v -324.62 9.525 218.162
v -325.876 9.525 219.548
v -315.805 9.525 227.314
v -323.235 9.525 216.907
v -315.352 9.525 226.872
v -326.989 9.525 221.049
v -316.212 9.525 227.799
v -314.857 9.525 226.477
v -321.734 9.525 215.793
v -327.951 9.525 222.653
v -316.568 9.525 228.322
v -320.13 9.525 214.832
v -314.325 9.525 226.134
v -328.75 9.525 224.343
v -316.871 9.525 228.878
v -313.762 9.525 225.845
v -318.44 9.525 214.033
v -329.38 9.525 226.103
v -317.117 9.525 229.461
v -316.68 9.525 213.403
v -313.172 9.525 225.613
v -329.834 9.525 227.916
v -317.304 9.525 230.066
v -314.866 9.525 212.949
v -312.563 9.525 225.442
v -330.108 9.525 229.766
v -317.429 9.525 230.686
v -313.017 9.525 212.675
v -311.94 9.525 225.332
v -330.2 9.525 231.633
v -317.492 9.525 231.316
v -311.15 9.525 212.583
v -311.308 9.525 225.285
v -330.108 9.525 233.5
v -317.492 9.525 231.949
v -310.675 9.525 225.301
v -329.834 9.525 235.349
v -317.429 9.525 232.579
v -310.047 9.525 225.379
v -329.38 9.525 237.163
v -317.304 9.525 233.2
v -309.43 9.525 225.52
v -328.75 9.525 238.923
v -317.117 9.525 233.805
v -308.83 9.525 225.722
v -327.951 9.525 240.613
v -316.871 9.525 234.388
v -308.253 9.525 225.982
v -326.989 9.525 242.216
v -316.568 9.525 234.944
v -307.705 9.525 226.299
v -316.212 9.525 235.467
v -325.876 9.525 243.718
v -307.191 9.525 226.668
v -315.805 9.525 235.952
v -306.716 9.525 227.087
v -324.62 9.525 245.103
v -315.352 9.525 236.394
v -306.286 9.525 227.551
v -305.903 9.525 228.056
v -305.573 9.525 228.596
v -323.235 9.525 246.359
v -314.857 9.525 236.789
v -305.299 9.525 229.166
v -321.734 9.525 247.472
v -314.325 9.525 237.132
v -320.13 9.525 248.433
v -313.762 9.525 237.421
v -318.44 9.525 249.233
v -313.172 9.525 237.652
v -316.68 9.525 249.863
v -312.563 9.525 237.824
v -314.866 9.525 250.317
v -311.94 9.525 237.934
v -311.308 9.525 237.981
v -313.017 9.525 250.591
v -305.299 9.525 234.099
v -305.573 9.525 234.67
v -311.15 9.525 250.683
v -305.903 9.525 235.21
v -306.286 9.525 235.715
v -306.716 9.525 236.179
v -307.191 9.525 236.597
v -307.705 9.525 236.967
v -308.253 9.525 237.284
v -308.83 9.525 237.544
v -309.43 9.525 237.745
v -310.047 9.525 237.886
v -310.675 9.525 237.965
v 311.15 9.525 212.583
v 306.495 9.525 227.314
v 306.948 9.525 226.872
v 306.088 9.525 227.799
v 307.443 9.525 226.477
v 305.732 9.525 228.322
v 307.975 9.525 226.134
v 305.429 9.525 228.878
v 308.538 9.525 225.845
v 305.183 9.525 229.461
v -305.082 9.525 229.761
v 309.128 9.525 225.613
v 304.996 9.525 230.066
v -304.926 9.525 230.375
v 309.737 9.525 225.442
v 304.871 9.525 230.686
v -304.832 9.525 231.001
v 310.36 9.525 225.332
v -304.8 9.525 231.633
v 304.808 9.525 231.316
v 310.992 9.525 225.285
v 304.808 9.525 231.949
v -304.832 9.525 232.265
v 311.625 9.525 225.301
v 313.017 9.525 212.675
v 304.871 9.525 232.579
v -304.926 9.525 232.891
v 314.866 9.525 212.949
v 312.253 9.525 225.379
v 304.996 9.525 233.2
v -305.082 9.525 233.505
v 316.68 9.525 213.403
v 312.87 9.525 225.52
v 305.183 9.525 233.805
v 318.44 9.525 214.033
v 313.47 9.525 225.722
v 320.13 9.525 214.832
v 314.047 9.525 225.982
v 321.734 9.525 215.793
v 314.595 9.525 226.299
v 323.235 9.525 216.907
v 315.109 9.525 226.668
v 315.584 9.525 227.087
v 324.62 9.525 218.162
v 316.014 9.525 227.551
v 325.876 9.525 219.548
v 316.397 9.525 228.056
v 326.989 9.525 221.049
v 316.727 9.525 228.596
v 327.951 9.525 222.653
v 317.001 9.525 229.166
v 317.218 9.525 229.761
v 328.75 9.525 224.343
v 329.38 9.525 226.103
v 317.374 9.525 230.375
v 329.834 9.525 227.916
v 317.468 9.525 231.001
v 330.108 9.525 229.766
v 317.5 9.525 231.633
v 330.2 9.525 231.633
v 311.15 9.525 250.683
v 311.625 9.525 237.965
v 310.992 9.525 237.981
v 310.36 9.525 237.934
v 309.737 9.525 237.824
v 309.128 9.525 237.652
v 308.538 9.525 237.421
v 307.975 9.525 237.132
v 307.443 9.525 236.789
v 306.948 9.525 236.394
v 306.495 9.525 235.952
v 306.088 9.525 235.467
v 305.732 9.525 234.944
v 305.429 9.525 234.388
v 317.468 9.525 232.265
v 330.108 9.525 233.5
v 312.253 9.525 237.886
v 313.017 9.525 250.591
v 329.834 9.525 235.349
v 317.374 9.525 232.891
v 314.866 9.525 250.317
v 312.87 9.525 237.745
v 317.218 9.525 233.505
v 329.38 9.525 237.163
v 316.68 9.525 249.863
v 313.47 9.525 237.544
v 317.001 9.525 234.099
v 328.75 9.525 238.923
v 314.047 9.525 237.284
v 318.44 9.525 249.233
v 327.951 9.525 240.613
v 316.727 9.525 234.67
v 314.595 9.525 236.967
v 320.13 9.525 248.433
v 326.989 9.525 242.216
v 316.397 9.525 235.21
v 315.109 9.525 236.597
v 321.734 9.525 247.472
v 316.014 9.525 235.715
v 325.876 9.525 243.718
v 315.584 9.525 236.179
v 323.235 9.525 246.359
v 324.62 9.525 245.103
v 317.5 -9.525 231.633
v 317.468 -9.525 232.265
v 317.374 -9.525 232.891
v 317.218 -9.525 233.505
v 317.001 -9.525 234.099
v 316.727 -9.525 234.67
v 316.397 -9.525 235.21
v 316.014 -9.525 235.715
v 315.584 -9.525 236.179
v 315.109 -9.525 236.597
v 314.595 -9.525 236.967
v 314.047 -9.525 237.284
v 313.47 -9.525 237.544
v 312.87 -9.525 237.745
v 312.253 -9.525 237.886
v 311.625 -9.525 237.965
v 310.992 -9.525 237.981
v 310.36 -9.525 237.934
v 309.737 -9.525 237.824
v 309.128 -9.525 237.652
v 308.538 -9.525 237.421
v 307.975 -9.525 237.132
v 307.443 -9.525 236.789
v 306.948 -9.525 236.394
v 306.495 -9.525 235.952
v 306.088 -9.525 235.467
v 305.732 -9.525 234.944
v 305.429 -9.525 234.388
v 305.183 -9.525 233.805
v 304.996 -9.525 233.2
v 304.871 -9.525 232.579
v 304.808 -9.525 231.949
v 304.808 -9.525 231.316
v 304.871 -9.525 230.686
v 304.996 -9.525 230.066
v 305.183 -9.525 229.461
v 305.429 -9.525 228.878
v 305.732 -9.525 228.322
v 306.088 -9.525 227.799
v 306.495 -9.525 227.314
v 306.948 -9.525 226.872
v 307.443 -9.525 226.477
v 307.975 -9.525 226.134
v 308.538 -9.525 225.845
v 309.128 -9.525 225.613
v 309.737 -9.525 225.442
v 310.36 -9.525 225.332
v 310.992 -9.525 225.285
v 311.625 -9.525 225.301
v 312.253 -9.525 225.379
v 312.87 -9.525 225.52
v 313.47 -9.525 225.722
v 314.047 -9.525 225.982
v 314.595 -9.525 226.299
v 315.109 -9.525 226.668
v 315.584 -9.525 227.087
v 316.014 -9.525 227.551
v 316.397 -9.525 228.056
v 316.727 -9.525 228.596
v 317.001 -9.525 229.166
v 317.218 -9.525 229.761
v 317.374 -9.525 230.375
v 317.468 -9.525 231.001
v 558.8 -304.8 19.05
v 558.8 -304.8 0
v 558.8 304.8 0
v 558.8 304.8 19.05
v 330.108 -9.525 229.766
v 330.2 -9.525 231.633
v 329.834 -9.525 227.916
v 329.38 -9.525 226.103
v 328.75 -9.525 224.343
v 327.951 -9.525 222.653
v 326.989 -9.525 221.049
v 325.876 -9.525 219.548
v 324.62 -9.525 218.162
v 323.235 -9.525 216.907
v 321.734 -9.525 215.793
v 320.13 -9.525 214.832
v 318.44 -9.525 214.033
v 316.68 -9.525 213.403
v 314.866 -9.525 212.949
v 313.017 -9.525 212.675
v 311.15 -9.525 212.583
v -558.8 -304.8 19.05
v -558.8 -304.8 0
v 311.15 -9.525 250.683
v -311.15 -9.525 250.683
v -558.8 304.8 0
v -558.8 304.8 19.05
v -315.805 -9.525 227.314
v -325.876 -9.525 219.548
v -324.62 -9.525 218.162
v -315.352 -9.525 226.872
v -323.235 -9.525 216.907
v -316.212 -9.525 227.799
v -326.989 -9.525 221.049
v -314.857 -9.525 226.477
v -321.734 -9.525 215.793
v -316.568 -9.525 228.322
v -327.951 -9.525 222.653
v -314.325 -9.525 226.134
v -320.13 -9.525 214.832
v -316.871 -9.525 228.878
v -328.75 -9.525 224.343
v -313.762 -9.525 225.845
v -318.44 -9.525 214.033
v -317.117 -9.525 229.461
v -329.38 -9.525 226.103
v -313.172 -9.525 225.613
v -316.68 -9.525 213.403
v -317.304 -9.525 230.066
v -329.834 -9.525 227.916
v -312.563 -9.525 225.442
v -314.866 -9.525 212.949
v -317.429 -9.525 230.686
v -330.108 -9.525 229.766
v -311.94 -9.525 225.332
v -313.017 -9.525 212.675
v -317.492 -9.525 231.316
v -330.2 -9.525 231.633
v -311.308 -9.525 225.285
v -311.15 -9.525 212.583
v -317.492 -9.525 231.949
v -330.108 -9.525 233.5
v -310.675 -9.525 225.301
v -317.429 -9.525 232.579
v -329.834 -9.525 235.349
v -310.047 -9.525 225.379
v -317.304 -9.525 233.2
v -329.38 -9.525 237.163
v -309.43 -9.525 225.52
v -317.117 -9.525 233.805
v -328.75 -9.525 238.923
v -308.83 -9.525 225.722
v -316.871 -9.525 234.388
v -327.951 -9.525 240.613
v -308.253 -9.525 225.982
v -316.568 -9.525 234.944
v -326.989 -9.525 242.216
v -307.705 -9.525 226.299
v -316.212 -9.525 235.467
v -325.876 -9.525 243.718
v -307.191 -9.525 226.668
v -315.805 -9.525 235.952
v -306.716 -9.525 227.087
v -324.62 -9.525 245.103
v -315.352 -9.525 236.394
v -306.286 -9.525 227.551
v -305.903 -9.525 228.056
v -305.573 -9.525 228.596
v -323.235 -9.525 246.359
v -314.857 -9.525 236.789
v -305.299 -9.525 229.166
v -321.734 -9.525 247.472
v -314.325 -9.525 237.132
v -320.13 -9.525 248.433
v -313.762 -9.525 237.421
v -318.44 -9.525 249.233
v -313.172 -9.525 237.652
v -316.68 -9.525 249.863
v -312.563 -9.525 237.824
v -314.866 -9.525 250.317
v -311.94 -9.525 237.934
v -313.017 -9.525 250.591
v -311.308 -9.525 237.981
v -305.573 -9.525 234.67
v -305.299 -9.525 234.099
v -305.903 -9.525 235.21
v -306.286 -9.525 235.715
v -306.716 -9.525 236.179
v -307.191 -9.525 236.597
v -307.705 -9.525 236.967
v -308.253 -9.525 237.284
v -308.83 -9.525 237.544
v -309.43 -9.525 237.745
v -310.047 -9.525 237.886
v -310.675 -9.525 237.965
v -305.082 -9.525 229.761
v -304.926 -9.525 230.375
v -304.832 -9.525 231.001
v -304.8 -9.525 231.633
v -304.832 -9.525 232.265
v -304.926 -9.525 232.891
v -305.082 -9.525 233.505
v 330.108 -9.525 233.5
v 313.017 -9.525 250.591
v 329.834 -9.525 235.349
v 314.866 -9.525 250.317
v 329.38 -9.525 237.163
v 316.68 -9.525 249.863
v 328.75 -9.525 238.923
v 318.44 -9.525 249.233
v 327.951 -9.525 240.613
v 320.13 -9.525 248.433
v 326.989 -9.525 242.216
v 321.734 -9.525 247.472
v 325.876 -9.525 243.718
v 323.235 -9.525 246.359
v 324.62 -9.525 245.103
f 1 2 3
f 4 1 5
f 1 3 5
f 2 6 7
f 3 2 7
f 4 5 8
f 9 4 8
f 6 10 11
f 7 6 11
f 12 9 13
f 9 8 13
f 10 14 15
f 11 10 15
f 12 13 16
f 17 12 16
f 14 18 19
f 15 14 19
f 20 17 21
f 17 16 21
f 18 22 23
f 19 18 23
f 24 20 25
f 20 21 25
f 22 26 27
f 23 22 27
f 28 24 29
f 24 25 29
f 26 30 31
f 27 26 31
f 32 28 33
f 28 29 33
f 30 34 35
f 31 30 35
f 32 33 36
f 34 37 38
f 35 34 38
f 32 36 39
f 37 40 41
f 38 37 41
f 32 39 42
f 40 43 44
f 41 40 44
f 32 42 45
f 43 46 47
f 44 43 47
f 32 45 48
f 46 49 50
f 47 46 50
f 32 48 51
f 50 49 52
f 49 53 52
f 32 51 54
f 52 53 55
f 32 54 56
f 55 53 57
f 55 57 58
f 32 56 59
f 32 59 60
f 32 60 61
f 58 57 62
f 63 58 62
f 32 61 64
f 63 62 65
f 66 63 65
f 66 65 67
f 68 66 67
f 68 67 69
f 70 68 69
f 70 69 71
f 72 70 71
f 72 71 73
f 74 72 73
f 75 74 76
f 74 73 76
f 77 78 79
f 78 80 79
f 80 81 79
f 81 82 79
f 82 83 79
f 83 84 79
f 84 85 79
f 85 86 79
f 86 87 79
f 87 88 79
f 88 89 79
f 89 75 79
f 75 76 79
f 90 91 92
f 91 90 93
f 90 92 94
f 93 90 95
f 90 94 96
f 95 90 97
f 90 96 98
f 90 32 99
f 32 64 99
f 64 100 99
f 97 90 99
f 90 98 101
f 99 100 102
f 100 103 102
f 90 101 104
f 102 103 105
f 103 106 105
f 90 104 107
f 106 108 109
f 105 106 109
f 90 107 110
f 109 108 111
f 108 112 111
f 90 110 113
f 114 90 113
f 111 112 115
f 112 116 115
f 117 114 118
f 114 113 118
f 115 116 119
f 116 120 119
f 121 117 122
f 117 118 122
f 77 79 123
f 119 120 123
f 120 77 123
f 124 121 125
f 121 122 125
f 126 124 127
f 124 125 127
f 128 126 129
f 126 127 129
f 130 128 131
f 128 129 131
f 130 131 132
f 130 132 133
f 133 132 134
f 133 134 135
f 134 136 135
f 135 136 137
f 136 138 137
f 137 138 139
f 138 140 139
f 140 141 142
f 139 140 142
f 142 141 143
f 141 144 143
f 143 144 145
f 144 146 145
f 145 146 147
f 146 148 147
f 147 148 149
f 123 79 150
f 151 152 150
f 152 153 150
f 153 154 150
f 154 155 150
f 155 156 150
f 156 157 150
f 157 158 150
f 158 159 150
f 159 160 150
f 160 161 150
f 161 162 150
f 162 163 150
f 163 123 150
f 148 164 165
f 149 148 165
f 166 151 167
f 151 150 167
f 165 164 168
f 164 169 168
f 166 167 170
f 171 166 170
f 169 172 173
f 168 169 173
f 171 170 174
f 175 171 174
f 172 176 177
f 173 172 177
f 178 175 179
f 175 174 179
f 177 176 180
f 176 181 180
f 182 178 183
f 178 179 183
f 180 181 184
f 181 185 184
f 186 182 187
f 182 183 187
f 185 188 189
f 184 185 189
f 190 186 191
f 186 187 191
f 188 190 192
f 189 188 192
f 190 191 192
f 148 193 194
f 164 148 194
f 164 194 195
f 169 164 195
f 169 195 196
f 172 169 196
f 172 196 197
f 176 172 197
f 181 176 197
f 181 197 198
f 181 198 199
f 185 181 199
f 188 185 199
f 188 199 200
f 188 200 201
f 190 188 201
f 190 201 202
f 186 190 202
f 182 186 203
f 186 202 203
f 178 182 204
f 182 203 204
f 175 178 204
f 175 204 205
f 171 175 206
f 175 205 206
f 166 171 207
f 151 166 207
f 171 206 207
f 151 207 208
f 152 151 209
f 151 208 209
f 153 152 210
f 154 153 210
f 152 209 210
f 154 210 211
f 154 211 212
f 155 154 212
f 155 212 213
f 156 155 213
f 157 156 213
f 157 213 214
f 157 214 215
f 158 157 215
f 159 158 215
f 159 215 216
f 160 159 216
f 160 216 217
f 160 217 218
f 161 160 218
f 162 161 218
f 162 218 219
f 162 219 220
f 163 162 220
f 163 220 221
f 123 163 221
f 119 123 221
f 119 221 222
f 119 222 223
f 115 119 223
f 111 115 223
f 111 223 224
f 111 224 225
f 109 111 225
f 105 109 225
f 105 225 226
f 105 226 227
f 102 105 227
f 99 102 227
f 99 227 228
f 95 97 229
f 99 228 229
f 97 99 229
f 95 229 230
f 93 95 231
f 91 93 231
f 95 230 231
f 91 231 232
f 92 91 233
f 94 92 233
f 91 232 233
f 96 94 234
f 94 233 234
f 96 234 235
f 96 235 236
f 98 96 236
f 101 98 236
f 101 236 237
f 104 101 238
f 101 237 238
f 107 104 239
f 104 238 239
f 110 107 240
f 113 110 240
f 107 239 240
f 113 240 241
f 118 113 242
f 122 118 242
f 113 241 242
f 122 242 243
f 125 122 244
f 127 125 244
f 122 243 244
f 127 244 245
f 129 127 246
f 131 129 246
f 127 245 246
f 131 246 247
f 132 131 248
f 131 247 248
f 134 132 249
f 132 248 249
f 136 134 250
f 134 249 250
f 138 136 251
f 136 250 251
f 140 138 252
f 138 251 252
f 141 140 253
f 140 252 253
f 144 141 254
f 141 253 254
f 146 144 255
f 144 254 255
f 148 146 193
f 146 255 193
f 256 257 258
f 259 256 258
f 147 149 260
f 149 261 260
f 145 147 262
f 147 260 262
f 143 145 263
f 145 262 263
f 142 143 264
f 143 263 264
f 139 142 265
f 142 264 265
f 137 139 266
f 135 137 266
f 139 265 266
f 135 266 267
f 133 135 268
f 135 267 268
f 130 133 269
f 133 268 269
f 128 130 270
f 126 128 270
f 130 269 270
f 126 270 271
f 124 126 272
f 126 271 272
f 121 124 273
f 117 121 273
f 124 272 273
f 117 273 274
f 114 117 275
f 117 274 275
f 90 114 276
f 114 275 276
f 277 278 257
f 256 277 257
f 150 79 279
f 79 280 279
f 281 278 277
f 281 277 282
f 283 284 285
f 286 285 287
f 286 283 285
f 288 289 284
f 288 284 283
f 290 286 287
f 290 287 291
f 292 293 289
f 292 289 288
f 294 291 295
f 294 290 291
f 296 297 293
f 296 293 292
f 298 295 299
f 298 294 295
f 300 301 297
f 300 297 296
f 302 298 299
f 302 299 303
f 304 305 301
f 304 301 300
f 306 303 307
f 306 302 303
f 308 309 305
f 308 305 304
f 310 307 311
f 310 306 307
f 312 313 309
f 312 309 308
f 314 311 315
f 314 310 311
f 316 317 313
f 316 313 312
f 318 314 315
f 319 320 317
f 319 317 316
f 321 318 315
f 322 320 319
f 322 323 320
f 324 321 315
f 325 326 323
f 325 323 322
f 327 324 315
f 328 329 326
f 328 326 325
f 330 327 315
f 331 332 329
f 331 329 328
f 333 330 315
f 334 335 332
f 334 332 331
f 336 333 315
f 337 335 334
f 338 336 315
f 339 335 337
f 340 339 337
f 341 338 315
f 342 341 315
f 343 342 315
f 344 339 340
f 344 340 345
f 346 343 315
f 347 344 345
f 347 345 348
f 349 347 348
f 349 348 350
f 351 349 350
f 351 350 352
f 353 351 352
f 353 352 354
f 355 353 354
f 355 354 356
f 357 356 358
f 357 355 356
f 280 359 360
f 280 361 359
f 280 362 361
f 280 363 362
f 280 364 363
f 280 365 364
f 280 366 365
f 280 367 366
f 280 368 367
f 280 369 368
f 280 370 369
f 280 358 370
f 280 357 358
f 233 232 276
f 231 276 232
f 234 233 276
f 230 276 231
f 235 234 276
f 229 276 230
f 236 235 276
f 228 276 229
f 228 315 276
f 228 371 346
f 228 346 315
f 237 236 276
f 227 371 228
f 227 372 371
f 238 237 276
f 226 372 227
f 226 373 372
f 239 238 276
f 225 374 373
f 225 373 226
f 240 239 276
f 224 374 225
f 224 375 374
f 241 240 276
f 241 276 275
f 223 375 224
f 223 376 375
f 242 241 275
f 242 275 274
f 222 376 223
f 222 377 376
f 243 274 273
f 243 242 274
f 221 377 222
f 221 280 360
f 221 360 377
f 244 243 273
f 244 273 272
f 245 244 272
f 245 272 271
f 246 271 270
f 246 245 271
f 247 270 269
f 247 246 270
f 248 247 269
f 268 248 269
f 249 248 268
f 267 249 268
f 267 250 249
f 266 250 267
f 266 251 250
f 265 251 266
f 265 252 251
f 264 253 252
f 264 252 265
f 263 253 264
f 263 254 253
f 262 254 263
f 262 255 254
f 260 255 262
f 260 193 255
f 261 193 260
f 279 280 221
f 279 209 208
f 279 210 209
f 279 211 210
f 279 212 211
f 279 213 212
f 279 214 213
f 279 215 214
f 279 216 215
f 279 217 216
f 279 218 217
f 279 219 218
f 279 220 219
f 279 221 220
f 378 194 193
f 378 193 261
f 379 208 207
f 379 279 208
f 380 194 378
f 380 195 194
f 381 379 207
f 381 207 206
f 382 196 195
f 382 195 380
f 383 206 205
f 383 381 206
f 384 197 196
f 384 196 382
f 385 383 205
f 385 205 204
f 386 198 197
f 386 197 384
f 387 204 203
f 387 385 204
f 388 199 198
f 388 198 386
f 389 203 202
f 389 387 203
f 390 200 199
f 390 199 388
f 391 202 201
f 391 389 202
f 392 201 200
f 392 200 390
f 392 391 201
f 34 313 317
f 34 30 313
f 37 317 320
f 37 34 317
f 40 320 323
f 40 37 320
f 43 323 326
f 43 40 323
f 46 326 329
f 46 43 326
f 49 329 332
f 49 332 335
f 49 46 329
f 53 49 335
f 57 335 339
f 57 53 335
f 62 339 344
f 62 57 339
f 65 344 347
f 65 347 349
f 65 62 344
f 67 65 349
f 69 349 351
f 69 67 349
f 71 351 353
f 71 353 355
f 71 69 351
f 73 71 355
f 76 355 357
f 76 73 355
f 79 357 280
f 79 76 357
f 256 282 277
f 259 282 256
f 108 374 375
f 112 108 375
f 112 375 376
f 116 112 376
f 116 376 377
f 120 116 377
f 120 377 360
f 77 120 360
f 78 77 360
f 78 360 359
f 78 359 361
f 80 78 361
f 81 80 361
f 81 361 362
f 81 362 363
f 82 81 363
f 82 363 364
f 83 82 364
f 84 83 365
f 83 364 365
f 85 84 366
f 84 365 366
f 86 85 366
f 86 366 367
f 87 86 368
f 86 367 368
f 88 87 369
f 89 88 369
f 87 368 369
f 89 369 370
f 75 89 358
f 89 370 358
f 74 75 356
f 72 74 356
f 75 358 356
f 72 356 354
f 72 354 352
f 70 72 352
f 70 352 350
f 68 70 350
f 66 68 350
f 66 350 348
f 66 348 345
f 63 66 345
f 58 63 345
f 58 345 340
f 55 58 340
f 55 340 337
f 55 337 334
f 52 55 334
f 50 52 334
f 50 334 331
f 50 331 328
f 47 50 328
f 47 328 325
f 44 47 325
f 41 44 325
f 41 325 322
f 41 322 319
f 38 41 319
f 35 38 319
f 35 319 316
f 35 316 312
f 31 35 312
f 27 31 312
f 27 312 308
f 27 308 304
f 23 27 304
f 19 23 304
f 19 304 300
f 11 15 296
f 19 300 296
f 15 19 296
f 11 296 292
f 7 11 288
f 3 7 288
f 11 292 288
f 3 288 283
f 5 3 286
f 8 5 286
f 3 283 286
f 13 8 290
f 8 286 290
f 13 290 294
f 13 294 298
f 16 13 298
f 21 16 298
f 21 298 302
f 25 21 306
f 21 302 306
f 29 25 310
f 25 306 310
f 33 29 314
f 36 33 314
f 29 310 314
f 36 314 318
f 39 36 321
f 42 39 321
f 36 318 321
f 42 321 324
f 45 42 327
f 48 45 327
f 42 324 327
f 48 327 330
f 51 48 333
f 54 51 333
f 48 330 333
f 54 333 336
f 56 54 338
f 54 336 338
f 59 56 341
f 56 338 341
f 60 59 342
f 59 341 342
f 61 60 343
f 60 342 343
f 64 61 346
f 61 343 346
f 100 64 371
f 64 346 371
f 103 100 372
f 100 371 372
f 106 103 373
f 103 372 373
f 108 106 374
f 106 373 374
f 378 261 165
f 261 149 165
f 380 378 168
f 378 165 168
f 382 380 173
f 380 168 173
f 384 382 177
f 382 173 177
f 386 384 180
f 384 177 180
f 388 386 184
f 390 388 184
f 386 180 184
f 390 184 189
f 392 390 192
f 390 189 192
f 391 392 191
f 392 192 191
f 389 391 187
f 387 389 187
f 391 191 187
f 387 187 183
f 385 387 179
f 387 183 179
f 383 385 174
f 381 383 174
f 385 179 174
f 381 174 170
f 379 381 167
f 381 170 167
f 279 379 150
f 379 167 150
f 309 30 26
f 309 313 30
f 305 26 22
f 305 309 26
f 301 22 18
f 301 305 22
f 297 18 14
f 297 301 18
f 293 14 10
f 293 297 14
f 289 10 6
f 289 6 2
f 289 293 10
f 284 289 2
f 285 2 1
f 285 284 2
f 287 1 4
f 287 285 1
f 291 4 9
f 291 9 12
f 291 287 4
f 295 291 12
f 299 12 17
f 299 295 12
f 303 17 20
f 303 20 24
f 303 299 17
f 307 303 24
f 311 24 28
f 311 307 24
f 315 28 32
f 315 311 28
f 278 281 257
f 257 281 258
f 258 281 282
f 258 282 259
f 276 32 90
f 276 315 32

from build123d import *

# Parameters (mm, degrees)
F0_W     = 1117.6
F0_H     = 609.6
F1_DEPTH = 19.05
F2_W     = 660.4
F2_H     = 38.1
F3_DEPTH = 9.525
F4_R     = 19.04999
F5_R     = 6.35
F6_DEPTH = 314.326


# Not quite as in the source:
# - a fillet or chamfer is up to 0.001 mm smaller than in the source, because OpenCascade refuses the exact size


with BuildPart() as f1:
    # F0 (on Top) → F1 (new body)
    with BuildSketch(Plane.XY):
        Rectangle(F0_W, F0_H)
    extrude(amount=F1_DEPTH)


with BuildPart() as f3:
    # F2 (on Front) → F3 (new body, symmetric)
    with BuildSketch(Plane.XZ):
        with Locations((0, 231.6328159059)):
            Rectangle(F2_W, F2_H)
    extrude(amount=F3_DEPTH, both=True)

    # F4 (radius 19.05 in the source; OpenCascade refuses exactly that, so slightly less here)
    f4_edges = [f3.edges().sort_by_distance(p)[0] for p in [
        (330.2, 0, 250.682816),
        (330.2, 0, 212.582816),
        (-330.2, 0, 250.682816),
        (-330.2, 0, 212.582816),
    ]]
    fillet(f4_edges, radius=F4_R)

    # F5 (on face) → F6 (cut, through all)
    with BuildSketch(Plane.XZ.offset(9.525)):
        with Locations((-311.15, 231.6328159059)):
            Circle(F5_R)
        with Locations((311.15, 231.6328159059)):
            Circle(F5_R)
    extrude(amount=-F6_DEPTH, mode=Mode.SUBTRACT)


solid = Compound([f1.part, f3.part])
